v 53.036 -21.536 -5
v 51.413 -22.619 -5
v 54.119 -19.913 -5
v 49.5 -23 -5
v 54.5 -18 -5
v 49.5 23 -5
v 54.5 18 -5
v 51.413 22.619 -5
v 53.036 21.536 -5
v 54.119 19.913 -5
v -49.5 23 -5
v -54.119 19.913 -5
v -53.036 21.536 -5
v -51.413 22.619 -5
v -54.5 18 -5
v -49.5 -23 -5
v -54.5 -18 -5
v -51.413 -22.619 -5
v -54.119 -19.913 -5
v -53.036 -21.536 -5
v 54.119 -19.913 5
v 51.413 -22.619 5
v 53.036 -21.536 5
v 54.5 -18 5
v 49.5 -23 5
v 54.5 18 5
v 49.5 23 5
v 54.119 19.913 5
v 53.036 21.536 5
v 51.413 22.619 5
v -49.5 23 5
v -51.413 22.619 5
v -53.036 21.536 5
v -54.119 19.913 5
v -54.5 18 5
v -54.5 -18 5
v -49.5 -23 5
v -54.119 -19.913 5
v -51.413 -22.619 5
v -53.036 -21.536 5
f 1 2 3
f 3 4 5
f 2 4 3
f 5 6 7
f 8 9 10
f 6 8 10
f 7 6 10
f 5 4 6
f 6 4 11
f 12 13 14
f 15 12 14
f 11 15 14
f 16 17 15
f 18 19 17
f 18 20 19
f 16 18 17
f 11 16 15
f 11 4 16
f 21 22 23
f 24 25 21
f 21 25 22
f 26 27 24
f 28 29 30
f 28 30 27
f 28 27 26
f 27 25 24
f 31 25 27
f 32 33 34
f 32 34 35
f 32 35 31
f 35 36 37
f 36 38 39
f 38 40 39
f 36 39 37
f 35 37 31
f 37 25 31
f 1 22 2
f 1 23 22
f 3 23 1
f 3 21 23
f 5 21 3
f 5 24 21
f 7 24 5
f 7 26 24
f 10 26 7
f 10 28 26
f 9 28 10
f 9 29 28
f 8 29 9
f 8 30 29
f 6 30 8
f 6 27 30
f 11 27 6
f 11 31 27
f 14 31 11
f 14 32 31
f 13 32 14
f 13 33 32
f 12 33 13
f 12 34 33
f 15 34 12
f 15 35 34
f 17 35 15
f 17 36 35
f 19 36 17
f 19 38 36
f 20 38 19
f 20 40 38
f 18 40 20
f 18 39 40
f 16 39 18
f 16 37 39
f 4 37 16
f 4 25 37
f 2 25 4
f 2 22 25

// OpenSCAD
// Width of the rectangle
width = 109;  

// Height of the rectangle
height = 46;  

// Rounding Radius
rounding = 5;

// Thickness of the 3D object along the Z-axis
thickness = 10; 

// Main shape function for 2D shape
module rounded_rectangle(width, height, rounding) {
    offset(r = rounding)
        square([width - 2*rounding, height - 2*rounding], center = true);
}

// Render the shape and apply extrusion
linear_extrude(height = thickness, center = true) {
    rounded_rectangle(width, height, rounding);
}
